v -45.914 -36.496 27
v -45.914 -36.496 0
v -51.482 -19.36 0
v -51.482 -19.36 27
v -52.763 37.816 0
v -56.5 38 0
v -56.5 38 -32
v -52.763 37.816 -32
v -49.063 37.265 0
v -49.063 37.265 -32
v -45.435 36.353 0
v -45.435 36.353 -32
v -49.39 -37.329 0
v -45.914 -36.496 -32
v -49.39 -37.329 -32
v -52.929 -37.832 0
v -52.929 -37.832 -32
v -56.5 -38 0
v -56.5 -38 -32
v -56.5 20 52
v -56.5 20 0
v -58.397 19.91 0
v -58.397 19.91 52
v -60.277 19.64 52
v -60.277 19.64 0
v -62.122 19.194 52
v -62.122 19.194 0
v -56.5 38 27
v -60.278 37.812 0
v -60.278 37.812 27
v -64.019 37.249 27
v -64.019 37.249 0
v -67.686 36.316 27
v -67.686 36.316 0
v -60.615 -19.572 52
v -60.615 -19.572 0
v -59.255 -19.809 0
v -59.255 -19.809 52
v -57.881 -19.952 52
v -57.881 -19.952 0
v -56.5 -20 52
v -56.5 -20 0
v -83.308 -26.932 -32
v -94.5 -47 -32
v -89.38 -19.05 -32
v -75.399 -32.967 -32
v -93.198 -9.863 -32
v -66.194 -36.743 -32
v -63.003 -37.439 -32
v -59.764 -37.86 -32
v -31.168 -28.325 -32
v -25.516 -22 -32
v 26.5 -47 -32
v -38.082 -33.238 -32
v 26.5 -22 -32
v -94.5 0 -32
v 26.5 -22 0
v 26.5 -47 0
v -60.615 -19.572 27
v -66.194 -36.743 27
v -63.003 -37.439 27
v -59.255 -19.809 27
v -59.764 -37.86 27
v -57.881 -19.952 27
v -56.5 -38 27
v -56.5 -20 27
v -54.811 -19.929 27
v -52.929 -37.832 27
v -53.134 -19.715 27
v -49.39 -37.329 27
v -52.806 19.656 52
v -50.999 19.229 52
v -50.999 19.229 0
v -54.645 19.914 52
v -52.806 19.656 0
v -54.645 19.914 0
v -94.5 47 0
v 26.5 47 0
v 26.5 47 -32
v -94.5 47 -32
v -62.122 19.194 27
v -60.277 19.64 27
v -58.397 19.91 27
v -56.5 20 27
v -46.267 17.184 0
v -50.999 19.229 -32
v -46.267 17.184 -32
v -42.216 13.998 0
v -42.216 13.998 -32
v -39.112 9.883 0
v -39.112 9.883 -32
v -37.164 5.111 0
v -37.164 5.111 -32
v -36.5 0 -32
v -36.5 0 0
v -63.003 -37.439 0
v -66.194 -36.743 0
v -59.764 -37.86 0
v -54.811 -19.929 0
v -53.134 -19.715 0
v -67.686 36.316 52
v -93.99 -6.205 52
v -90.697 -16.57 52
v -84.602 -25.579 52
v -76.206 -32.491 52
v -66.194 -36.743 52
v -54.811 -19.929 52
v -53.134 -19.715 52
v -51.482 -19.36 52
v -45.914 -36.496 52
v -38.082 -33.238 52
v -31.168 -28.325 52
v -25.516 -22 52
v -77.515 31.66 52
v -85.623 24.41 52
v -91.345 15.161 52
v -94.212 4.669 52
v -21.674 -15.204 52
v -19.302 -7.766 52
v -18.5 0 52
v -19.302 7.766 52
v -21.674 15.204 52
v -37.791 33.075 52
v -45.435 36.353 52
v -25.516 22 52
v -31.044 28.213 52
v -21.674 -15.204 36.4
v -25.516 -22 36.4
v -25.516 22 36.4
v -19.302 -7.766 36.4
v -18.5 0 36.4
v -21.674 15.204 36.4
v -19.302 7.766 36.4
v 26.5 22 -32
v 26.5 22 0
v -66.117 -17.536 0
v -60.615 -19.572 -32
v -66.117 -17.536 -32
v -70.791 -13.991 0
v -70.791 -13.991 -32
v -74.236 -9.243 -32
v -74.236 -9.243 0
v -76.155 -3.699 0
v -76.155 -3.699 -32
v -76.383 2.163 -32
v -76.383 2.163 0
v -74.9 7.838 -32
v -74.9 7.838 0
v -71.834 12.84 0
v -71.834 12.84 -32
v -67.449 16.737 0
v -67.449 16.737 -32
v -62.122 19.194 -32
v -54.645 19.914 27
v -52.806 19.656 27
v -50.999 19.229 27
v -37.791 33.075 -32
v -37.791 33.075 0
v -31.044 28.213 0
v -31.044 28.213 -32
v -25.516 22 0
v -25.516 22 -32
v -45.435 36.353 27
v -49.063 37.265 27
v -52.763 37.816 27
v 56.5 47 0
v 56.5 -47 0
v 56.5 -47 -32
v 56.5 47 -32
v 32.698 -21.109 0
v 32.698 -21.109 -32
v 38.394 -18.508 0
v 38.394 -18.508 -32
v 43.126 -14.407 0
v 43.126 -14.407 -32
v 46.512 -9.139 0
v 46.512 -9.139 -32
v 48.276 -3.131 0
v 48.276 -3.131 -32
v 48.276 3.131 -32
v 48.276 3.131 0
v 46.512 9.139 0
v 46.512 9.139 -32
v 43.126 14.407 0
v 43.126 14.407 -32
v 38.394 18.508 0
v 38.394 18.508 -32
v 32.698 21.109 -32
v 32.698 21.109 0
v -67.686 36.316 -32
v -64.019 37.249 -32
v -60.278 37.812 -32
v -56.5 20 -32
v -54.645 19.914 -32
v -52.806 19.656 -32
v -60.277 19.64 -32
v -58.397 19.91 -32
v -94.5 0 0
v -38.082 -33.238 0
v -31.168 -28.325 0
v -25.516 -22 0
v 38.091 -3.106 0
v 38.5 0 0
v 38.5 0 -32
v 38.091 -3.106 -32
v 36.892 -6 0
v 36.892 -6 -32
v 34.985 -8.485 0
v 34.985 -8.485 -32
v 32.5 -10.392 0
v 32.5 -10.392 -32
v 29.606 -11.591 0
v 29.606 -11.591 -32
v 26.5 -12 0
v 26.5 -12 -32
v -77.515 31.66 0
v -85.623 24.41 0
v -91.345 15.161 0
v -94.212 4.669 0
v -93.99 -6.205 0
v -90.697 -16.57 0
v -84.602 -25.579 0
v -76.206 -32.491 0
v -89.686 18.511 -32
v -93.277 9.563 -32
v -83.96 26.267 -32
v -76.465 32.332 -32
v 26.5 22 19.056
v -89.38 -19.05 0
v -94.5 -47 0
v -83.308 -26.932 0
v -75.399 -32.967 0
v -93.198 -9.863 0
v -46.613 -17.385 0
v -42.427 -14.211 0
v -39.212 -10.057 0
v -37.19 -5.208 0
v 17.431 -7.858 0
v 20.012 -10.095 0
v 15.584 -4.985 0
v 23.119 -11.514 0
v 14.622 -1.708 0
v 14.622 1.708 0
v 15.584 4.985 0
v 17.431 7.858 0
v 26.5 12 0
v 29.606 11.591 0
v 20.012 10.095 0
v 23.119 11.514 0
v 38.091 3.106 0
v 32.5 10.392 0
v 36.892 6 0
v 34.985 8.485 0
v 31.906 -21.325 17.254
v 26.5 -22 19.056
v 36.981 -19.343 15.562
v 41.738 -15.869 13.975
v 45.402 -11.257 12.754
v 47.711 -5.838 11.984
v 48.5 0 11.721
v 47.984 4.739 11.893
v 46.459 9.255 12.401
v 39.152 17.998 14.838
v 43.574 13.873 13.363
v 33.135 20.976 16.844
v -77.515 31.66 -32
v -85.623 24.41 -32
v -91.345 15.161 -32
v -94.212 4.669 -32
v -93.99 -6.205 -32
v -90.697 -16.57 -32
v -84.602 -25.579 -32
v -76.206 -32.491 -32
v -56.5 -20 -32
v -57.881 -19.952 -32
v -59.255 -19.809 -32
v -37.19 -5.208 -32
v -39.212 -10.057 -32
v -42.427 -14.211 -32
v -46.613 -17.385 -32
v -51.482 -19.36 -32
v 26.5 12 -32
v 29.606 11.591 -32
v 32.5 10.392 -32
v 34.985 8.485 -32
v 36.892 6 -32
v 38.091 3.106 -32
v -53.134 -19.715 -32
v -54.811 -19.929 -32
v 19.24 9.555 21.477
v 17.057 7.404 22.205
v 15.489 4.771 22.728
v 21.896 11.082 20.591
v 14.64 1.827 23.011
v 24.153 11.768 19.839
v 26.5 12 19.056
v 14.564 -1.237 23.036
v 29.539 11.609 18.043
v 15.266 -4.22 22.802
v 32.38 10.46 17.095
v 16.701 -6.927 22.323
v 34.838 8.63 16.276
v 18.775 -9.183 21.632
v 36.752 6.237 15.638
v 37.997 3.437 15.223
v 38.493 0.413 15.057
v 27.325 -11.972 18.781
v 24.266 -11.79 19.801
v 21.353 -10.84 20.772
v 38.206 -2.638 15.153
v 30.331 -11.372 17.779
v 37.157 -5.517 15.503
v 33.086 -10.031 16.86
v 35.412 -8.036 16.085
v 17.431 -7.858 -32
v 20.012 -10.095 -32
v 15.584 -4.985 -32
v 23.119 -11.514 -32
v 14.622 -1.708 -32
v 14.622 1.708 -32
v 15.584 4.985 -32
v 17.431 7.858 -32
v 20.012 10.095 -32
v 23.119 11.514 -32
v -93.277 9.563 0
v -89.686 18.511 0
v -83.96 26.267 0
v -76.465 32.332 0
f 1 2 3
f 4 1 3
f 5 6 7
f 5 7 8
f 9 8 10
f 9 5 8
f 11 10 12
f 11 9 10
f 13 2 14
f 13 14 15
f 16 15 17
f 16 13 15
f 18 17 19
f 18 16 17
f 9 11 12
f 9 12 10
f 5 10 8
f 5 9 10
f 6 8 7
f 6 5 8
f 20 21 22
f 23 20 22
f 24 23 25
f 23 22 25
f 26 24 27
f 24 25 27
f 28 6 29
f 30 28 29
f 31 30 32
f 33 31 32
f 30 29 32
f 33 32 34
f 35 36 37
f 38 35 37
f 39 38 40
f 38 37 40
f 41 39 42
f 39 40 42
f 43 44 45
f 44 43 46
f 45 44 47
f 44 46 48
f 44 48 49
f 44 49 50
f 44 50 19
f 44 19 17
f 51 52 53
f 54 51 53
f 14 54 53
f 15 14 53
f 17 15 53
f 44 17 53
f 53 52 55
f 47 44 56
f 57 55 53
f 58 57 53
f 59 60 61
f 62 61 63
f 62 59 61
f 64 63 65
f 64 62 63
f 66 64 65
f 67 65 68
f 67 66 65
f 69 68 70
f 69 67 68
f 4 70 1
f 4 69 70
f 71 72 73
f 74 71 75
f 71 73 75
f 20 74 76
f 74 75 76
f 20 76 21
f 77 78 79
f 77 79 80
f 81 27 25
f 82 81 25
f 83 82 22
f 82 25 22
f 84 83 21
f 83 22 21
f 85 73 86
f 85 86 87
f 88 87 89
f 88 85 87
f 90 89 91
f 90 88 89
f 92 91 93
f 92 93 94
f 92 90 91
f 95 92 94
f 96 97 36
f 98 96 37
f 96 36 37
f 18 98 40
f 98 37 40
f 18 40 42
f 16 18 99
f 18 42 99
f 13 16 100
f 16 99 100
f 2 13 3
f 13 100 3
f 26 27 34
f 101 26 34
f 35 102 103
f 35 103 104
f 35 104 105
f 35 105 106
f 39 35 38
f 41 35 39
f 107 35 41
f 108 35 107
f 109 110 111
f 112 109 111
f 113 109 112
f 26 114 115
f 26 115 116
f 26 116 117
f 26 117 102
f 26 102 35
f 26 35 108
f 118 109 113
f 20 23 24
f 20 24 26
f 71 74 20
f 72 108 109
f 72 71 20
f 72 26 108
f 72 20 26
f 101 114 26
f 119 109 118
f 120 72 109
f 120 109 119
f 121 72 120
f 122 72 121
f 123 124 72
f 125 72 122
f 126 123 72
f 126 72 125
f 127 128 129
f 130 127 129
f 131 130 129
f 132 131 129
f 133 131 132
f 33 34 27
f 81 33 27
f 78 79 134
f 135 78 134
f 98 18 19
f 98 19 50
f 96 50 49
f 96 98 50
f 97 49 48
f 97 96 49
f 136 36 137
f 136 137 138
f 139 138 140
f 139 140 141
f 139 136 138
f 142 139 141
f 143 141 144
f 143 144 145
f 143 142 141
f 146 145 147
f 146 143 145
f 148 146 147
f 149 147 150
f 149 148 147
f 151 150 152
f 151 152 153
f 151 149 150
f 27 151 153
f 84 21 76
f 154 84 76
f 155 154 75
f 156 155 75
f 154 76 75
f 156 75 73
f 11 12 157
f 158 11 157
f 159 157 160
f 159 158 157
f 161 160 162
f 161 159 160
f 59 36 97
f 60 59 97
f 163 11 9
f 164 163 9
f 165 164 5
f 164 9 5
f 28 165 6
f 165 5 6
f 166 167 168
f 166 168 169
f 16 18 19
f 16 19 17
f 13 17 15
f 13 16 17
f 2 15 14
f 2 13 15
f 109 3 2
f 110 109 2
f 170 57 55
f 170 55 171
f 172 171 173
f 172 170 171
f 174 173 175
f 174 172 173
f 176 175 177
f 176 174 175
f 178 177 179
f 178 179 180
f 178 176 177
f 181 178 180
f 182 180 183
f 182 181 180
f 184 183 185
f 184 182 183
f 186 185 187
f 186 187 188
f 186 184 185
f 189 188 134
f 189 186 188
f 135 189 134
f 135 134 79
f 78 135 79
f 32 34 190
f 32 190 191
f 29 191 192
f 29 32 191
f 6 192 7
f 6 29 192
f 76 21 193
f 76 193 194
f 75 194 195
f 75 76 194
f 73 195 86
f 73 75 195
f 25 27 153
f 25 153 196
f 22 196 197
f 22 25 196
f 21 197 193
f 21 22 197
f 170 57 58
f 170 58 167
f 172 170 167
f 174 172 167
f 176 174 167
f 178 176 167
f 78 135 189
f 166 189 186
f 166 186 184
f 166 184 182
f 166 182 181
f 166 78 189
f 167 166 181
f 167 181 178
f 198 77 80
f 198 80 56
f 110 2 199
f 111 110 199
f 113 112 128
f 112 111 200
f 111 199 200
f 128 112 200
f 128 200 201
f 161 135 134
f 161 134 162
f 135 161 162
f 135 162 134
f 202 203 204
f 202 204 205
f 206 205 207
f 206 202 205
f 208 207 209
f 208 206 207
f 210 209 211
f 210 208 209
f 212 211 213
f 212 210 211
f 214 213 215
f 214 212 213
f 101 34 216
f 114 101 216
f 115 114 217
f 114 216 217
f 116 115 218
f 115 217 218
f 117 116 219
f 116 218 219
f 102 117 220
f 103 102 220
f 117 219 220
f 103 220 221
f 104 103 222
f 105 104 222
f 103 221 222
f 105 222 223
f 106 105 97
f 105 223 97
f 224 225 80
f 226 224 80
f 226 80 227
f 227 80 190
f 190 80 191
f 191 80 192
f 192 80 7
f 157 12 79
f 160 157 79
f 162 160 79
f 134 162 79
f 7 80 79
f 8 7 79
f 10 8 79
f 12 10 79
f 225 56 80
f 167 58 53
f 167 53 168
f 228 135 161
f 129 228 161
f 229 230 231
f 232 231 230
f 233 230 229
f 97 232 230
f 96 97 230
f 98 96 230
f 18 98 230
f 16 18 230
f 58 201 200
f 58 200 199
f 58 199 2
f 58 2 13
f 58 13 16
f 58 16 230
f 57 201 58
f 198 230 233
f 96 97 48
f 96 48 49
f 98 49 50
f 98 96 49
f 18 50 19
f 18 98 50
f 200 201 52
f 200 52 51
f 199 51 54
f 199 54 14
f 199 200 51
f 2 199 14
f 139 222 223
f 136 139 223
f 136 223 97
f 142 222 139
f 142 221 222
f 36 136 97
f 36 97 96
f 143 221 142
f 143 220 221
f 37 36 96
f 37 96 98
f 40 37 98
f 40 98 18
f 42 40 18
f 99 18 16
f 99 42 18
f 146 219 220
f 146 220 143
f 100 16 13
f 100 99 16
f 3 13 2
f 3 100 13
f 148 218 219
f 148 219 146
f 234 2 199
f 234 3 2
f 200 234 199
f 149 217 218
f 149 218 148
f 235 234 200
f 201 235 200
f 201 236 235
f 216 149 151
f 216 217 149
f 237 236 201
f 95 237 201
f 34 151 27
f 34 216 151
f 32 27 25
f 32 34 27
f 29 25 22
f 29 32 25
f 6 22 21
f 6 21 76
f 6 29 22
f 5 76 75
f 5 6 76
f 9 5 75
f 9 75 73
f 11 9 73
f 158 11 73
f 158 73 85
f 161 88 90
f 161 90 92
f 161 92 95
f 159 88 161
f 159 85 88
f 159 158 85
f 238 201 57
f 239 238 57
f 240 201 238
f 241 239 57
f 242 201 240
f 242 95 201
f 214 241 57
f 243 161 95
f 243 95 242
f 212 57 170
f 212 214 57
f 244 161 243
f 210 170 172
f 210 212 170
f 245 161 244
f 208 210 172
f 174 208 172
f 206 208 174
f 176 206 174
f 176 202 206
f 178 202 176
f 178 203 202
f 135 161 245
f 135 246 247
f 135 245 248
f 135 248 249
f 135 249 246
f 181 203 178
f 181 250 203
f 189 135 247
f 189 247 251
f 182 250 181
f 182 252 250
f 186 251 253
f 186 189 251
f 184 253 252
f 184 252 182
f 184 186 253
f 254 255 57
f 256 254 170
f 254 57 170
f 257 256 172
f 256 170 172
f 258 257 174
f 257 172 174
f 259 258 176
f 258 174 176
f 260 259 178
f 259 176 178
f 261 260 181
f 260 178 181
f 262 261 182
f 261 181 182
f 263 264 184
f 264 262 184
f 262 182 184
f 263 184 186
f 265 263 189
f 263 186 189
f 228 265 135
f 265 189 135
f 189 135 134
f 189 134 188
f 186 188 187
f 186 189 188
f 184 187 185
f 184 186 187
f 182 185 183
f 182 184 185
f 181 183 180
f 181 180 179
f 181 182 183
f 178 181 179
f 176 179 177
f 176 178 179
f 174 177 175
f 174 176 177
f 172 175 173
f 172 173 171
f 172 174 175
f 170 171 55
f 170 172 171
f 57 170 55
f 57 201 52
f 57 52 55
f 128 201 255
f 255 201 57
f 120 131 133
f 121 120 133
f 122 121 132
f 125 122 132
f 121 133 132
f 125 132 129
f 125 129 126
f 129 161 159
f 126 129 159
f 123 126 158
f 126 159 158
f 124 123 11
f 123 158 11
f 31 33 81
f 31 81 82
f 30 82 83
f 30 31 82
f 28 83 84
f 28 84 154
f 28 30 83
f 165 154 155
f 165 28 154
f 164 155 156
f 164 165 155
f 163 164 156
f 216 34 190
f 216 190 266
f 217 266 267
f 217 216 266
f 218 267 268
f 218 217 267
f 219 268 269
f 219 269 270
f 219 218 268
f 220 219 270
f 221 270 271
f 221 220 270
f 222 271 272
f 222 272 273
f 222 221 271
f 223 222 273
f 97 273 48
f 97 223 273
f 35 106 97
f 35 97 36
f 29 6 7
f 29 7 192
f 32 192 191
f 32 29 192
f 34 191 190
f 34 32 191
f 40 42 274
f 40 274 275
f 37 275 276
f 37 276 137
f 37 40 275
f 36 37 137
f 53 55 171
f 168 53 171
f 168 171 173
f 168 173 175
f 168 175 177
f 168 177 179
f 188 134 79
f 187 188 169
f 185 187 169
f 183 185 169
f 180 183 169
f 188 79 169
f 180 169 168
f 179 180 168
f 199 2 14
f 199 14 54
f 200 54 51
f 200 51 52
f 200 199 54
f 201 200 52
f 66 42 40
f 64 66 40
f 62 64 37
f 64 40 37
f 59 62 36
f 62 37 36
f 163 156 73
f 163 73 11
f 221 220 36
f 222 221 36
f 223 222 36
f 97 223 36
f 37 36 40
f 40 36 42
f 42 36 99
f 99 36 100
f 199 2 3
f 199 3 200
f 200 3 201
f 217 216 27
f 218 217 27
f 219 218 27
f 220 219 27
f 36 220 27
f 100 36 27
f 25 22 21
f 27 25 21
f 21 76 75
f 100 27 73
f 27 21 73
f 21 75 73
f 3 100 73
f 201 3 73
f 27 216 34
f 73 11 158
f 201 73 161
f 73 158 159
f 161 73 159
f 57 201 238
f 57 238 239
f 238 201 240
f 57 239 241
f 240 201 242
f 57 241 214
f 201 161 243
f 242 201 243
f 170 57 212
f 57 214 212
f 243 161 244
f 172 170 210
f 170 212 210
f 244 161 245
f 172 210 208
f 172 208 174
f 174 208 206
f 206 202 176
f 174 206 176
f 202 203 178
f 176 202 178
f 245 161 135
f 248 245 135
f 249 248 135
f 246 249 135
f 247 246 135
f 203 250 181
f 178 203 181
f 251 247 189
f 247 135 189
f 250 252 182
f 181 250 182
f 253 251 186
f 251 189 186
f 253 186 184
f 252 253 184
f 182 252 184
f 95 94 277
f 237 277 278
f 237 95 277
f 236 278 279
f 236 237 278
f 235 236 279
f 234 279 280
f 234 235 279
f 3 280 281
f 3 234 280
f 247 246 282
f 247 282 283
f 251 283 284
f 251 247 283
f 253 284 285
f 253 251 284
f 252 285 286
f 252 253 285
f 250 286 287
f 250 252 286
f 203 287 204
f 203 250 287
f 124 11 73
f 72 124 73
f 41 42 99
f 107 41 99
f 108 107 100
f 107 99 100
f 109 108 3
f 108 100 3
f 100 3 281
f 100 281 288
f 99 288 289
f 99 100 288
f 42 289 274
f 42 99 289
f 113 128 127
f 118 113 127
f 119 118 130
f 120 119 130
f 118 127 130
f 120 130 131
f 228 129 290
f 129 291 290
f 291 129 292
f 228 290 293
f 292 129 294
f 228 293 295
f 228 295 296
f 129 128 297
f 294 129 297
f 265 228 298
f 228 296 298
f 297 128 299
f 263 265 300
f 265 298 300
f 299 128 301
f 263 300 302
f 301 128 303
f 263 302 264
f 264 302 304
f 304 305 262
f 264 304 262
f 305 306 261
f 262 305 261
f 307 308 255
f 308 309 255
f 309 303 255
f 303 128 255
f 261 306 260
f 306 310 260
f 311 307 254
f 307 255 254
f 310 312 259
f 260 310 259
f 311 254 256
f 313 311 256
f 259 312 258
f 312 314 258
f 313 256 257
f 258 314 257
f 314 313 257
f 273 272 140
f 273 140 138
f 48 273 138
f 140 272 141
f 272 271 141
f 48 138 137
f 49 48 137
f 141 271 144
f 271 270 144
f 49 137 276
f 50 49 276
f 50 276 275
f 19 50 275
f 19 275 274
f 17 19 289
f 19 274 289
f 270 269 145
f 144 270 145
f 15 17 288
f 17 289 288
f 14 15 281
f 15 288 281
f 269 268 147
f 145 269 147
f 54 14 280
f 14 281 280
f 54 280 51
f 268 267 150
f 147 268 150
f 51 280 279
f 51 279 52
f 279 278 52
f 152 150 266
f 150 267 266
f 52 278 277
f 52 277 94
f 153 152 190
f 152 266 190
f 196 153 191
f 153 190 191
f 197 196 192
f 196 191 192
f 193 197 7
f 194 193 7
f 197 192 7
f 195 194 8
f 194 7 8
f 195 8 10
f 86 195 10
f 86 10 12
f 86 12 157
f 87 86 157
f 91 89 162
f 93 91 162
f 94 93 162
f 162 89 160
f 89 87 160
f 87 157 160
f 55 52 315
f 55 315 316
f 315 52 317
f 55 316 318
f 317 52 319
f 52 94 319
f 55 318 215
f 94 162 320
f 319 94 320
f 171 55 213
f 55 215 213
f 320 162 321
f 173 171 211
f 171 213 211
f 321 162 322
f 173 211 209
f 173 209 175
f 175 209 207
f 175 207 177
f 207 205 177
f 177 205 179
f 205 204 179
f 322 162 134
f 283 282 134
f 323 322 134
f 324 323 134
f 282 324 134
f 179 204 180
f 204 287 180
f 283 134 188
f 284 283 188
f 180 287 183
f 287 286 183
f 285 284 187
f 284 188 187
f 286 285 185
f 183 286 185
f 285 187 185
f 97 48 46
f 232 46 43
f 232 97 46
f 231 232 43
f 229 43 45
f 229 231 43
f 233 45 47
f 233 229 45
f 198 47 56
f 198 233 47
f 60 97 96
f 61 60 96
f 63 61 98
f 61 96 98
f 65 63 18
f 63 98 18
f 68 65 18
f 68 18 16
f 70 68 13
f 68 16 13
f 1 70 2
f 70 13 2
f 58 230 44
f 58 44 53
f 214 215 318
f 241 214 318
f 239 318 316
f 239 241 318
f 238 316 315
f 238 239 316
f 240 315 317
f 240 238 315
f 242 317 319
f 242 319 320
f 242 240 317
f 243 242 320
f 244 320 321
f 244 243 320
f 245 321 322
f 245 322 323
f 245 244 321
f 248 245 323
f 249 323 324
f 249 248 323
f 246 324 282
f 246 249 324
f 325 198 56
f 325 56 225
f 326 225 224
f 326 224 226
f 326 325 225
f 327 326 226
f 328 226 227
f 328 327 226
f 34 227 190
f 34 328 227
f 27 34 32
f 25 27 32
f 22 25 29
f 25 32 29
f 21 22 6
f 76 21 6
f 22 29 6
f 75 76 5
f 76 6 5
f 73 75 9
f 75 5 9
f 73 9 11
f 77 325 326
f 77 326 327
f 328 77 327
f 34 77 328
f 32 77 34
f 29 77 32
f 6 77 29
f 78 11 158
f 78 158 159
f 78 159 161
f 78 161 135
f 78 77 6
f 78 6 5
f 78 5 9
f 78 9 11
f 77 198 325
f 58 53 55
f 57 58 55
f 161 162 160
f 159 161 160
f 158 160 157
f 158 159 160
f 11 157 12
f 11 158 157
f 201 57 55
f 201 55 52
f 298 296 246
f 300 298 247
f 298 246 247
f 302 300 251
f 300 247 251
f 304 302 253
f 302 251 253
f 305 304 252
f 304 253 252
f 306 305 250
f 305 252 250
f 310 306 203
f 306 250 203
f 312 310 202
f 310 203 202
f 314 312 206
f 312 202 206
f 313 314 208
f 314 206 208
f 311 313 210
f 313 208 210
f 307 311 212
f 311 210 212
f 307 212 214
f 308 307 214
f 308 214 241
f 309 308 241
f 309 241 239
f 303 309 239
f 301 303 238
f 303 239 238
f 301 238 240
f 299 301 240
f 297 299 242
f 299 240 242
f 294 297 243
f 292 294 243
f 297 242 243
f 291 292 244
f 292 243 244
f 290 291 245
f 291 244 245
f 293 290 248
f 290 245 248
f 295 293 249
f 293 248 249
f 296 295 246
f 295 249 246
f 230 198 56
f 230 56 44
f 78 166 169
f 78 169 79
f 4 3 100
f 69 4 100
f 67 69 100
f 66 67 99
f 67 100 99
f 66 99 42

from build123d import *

# Parameters (mm, degrees)
F1_DEPTH = 52
F2_DEPTH = 27
F3_DEPTH = 32
F4_DEPTH = 32
F5_DEPTH = 12
F6_DEPTH = 24.4
F8_DEPTH = 74.5
F9_DEPTH = 32


with BuildPart() as f1:
    # F0 (on Top) → F1 (new body)
    with BuildSketch(Plane.XY):
        with BuildLine():
            ThreePointArc((-67.6857441339, 36.3163754823), (-87.0700692693, 22.5714612924), (-94.5, 1.882e-07))
            ThreePointArc((-94.5, 1.882e-07), (-86.6030709179, -23.1906257205), (-66.1944671175, -36.7425816636))
            Line((-66.1944671175, -36.7425816636), (-60.6154088174, -19.5720057803))
            ThreePointArc((-60.6154088174, -19.5720057803), (-76.4849090369, -0.7767952022), (-62.122189253, 19.1935142171))
            Line((-62.122189253, 19.1935142171), (-67.6857441339, 36.3163754823))
        make_face()
        with BuildLine():
            ThreePointArc((-18.5, 0), (-20.2964992214, 11.5458447667), (-25.5161332303, 22))
            ThreePointArc((-25.5161332303, 22), (-34.2843318109, 30.8295975795), (-45.4347623345, 36.3532737921))
            Line((-45.4347623345, 36.3532737921), (-50.9989145795, 19.2285740292))
            ThreePointArc((-50.9989145795, 19.2285740292), (-40.5309407226, 12.041143874), (-36.5, 0))
            ThreePointArc((-36.5, 0), (-40.6827641878, -12.2398958845), (-51.4815051263, -19.3601319521))
            Line((-51.4815051263, -19.3601319521), (-45.9138349552, -36.4956587781))
            ThreePointArc((-45.9138349552, -36.4956587781), (-34.4875508606, -30.9750235332), (-25.5161332303, -22))
            ThreePointArc((-25.5161332303, -22), (-20.2964992214, -11.5458447667), (-18.5, 0))
        make_face()
        with BuildLine():
            ThreePointArc((-36.5, 0), (-40.5309407226, 12.041143874), (-50.9989145795, 19.2285740292))
            ThreePointArc((-50.9989145795, 19.2285740292), (-53.7225443824, 19.8062045908), (-56.5, 20))
            Line((-56.5, 20), (-56.5, 0))
            Line((-56.5, 0), (-56.5, -20))
            ThreePointArc((-56.5, -20), (-53.9704386785, -19.8393880833), (-51.4815051263, -19.3601319521))
            ThreePointArc((-51.4815051263, -19.3601319521), (-40.6827641878, -12.2398958845), (-36.5, 0))
        make_face()
        with BuildLine():
            ThreePointArc((-56.5, 20), (-59.339869333, 19.797351898), (-62.122189253, 19.1935142171))
            ThreePointArc((-62.122189253, 19.1935142171), (-76.4849090369, -0.7767952022), (-60.6154088174, -19.5720057803))
            ThreePointArc((-60.6154088174, -19.5720057803), (-58.5688021163, -19.8927136863), (-56.5, -20))
            Line((-56.5, -20), (-56.5, 0))
            Line((-56.5, 0), (-56.5, 20))
        make_face()
    extrude(amount=F1_DEPTH)

    # F0 (on Top) → F5 (join)
    with BuildSketch(Plane.XY):
        with BuildLine():
            Line((26.5, 12), (26.5, 22))
            Line((26.5, 22), (-25.5161332303, 22))
            ThreePointArc((-25.5161332303, 22), (-20.2964992214, 11.5458447667), (-18.5, 0))
            ThreePointArc((-18.5, 0), (-20.2964992214, -11.5458447667), (-25.5161332303, -22))
            Line((-25.5161332303, -22), (26.5, -22))
            Line((26.5, -22), (26.5, -12))
            ThreePointArc((26.5, -12), (14.5, 0), (26.5, 12))
        make_face()
        with BuildLine():
            ThreePointArc((26.5, -22), (48.5, 0), (26.5, 22))
            Line((26.5, 22), (26.5, 12))
            ThreePointArc((26.5, 12), (34.9852813742, 8.4852813742), (38.5, 0))
            ThreePointArc((38.5, 0), (34.9852813742, -8.4852813742), (26.5, -12))
            Line((26.5, -12), (26.5, -22))
        make_face()
    extrude(amount=F5_DEPTH)

    # F6 (add): a face of the model
    f6_faces = [f1.faces().sort_by_distance(p)[0] for p in [
        (8.8600631876, 0, 12),
    ]]
    extrude(f6_faces, amount=F6_DEPTH)

    # F7 (on face) → F8 (cut)
    with BuildSketch(Plane.XZ.offset(22)):
        Polygon((26.5, 19.0561972631), (26.5, 36.4), (-25.5161332303, 36.4), align=None)
        Polygon((48.5, 11.720710434), (48.5, 36.4), (26.5, 36.4), (26.5, 19.0561972631), align=None)
    extrude(amount=-F8_DEPTH, mode=Mode.SUBTRACT)


with BuildPart() as f2:
    # F0 (on Top) → F2 (new body)
    with BuildSketch(Plane.XY):
        with BuildLine():
            Line((-56.5, -20), (-56.5, -38))
            ThreePointArc((-56.5, -38), (-51.1537411943, -37.6220349899), (-45.9138349552, -36.4956587781))
            Line((-45.9138349552, -36.4956587781), (-51.4815051263, -19.3601319521))
            ThreePointArc((-51.4815051263, -19.3601319521), (-53.9704386785, -19.8393880833), (-56.5, -20))
        make_face()
        with BuildLine():
            Line((-60.6154088174, -19.5720057803), (-66.1944671175, -36.7425816636))
            ThreePointArc((-66.1944671175, -36.7425816636), (-61.3878367804, -37.6843342997), (-56.5, -38))
            Line((-56.5, -38), (-56.5, -20))
            ThreePointArc((-56.5, -20), (-58.5688021163, -19.8927136863), (-60.6154088174, -19.5720057803))
        make_face()
    extrude(amount=F2_DEPTH)


with BuildPart() as f2b:
    # F0 (on Top) → F2, piece 2 (new body)
    with BuildSketch(Plane.XY):
        with BuildLine():
            Line((-50.9989145795, 19.2285740292), (-45.4347623345, 36.3532737921))
            ThreePointArc((-45.4347623345, 36.3532737921), (-50.9064503265, 37.586063934), (-56.5, 38))
            Line((-56.5, 38), (-56.5, 20))
            ThreePointArc((-56.5, 20), (-53.7225443824, 19.8062045908), (-50.9989145795, 19.2285740292))
        make_face()
        with BuildLine():
            ThreePointArc((-56.5, 38), (-62.1558700336, 37.5767366088), (-67.6857441339, 36.3163754823))
            Line((-67.6857441339, 36.3163754823), (-62.122189253, 19.1935142171))
            ThreePointArc((-62.122189253, 19.1935142171), (-59.339869333, 19.797351898), (-56.5, 20))
            Line((-56.5, 20), (-56.5, 38))
        make_face()
    extrude(amount=F2_DEPTH)


with BuildPart() as f3:
    # F0 (on Top) → F3 (new body)
    with BuildSketch(Plane.XY):
        with BuildLine():
            Line((26.5, 47), (-56.5, 47))
            Line((-56.5, 47), (-94.5, 47))
            Line((-94.5, 47), (-94.5, 1.882e-07))
            ThreePointArc((-94.5, 1.882e-07), (-87.0700692693, 22.5714612924), (-67.6857441339, 36.3163754823))
            ThreePointArc((-67.6857441339, 36.3163754823), (-62.1558700336, 37.5767366088), (-56.5, 38))
            ThreePointArc((-56.5, 38), (-50.9064503265, 37.586063934), (-45.4347623345, 36.3532737921))
            ThreePointArc((-45.4347623345, 36.3532737921), (-34.2843318109, 30.8295975795), (-25.5161332303, 22))
            Line((-25.5161332303, 22), (26.5, 22))
            Line((26.5, 22), (26.5, 47))
        make_face()
    extrude(amount=-F3_DEPTH)


with BuildPart() as f3b:
    # F0 (on Top) → F3, piece 2 (new body)
    with BuildSketch(Plane.XY):
        with BuildLine():
            ThreePointArc((-66.1944671175, -36.7425816636), (-86.6030709179, -23.1906257205), (-94.5, 1.882e-07))
            Line((-94.5, 1.882e-07), (-94.5, -47))
            Line((-94.5, -47), (-56.5, -47))
            Line((-56.5, -47), (26.5, -47))
            Line((26.5, -47), (26.5, -22))
            Line((26.5, -22), (-25.5161332303, -22))
            ThreePointArc((-25.5161332303, -22), (-34.4875508606, -30.9750235332), (-45.9138349552, -36.4956587781))
            ThreePointArc((-45.9138349552, -36.4956587781), (-51.1537411943, -37.6220349899), (-56.5, -38))
            ThreePointArc((-56.5, -38), (-61.3878367804, -37.6843342997), (-66.1944671175, -36.7425816636))
        make_face()
    extrude(amount=-F3_DEPTH)


with BuildPart() as f4:
    # F0 (on Top) → F4 (new body)
    with BuildSketch(Plane.XY):
        with BuildLine():
            Line((56.5, 47), (26.5, 47))
            Line((26.5, 47), (26.5, 22))
            ThreePointArc((26.5, 22), (48.5, 0), (26.5, -22))
            Line((26.5, -22), (26.5, -47))
            Line((26.5, -47), (56.5, -47))
            Line((56.5, -47), (56.5, 47))
        make_face()
    extrude(amount=-F4_DEPTH)


with BuildPart() as f9:
    # F0 (on Top) → F9 (new body)
    with BuildSketch(Plane.XY):
        with BuildLine():
            ThreePointArc((26.5, -22), (48.5, 0), (26.5, 22))
            Line((26.5, 22), (26.5, 12))
            ThreePointArc((26.5, 12), (34.9852813742, 8.4852813742), (38.5, 0))
            ThreePointArc((38.5, 0), (34.9852813742, -8.4852813742), (26.5, -12))
            Line((26.5, -12), (26.5, -22))
        make_face()
        with BuildLine():
            Line((26.5, 12), (26.5, 22))
            Line((26.5, 22), (-25.5161332303, 22))
            ThreePointArc((-25.5161332303, 22), (-20.2964992214, 11.5458447667), (-18.5, 0))
            ThreePointArc((-18.5, 0), (-20.2964992214, -11.5458447667), (-25.5161332303, -22))
            Line((-25.5161332303, -22), (26.5, -22))
            Line((26.5, -22), (26.5, -12))
            ThreePointArc((26.5, -12), (14.5, 0), (26.5, 12))
        make_face()
        with BuildLine():
            ThreePointArc((-18.5, 0), (-20.2964992214, 11.5458447667), (-25.5161332303, 22))
            ThreePointArc((-25.5161332303, 22), (-34.2843318109, 30.8295975795), (-45.4347623345, 36.3532737921))
            Line((-45.4347623345, 36.3532737921), (-50.9989145795, 19.2285740292))
            ThreePointArc((-50.9989145795, 19.2285740292), (-40.5309407226, 12.041143874), (-36.5, 0))
            ThreePointArc((-36.5, 0), (-40.6827641878, -12.2398958845), (-51.4815051263, -19.3601319521))
            Line((-51.4815051263, -19.3601319521), (-45.9138349552, -36.4956587781))
            ThreePointArc((-45.9138349552, -36.4956587781), (-34.4875508606, -30.9750235332), (-25.5161332303, -22))
            ThreePointArc((-25.5161332303, -22), (-20.2964992214, -11.5458447667), (-18.5, 0))
        make_face()
        with BuildLine():
            Line((-50.9989145795, 19.2285740292), (-45.4347623345, 36.3532737921))
            ThreePointArc((-45.4347623345, 36.3532737921), (-50.9064503265, 37.586063934), (-56.5, 38))
            Line((-56.5, 38), (-56.5, 20))
            ThreePointArc((-56.5, 20), (-53.7225443824, 19.8062045908), (-50.9989145795, 19.2285740292))
        make_face()
        with BuildLine():
            ThreePointArc((-56.5, 38), (-62.1558700336, 37.5767366088), (-67.6857441339, 36.3163754823))
            Line((-67.6857441339, 36.3163754823), (-62.122189253, 19.1935142171))
            ThreePointArc((-62.122189253, 19.1935142171), (-59.339869333, 19.797351898), (-56.5, 20))
            Line((-56.5, 20), (-56.5, 38))
        make_face()
        with BuildLine():
            ThreePointArc((-67.6857441339, 36.3163754823), (-87.0700692693, 22.5714612924), (-94.5, 1.882e-07))
            ThreePointArc((-94.5, 1.882e-07), (-86.6030709179, -23.1906257205), (-66.1944671175, -36.7425816636))
            Line((-66.1944671175, -36.7425816636), (-60.6154088174, -19.5720057803))
            ThreePointArc((-60.6154088174, -19.5720057803), (-76.4849090369, -0.7767952022), (-62.122189253, 19.1935142171))
            Line((-62.122189253, 19.1935142171), (-67.6857441339, 36.3163754823))
        make_face()
        with BuildLine():
            Line((-56.5, -20), (-56.5, -38))
            ThreePointArc((-56.5, -38), (-51.1537411943, -37.6220349899), (-45.9138349552, -36.4956587781))
            Line((-45.9138349552, -36.4956587781), (-51.4815051263, -19.3601319521))
            ThreePointArc((-51.4815051263, -19.3601319521), (-53.9704386785, -19.8393880833), (-56.5, -20))
        make_face()
        with BuildLine():
            Line((-60.6154088174, -19.5720057803), (-66.1944671175, -36.7425816636))
            ThreePointArc((-66.1944671175, -36.7425816636), (-61.3878367804, -37.6843342997), (-56.5, -38))
            Line((-56.5, -38), (-56.5, -20))
            ThreePointArc((-56.5, -20), (-58.5688021163, -19.8927136863), (-60.6154088174, -19.5720057803))
        make_face()
    extrude(amount=-F9_DEPTH)


solid = Compound([f1.part, f2.part, f2b.part, f3.part, f3b.part, f4.part, f9.part])
